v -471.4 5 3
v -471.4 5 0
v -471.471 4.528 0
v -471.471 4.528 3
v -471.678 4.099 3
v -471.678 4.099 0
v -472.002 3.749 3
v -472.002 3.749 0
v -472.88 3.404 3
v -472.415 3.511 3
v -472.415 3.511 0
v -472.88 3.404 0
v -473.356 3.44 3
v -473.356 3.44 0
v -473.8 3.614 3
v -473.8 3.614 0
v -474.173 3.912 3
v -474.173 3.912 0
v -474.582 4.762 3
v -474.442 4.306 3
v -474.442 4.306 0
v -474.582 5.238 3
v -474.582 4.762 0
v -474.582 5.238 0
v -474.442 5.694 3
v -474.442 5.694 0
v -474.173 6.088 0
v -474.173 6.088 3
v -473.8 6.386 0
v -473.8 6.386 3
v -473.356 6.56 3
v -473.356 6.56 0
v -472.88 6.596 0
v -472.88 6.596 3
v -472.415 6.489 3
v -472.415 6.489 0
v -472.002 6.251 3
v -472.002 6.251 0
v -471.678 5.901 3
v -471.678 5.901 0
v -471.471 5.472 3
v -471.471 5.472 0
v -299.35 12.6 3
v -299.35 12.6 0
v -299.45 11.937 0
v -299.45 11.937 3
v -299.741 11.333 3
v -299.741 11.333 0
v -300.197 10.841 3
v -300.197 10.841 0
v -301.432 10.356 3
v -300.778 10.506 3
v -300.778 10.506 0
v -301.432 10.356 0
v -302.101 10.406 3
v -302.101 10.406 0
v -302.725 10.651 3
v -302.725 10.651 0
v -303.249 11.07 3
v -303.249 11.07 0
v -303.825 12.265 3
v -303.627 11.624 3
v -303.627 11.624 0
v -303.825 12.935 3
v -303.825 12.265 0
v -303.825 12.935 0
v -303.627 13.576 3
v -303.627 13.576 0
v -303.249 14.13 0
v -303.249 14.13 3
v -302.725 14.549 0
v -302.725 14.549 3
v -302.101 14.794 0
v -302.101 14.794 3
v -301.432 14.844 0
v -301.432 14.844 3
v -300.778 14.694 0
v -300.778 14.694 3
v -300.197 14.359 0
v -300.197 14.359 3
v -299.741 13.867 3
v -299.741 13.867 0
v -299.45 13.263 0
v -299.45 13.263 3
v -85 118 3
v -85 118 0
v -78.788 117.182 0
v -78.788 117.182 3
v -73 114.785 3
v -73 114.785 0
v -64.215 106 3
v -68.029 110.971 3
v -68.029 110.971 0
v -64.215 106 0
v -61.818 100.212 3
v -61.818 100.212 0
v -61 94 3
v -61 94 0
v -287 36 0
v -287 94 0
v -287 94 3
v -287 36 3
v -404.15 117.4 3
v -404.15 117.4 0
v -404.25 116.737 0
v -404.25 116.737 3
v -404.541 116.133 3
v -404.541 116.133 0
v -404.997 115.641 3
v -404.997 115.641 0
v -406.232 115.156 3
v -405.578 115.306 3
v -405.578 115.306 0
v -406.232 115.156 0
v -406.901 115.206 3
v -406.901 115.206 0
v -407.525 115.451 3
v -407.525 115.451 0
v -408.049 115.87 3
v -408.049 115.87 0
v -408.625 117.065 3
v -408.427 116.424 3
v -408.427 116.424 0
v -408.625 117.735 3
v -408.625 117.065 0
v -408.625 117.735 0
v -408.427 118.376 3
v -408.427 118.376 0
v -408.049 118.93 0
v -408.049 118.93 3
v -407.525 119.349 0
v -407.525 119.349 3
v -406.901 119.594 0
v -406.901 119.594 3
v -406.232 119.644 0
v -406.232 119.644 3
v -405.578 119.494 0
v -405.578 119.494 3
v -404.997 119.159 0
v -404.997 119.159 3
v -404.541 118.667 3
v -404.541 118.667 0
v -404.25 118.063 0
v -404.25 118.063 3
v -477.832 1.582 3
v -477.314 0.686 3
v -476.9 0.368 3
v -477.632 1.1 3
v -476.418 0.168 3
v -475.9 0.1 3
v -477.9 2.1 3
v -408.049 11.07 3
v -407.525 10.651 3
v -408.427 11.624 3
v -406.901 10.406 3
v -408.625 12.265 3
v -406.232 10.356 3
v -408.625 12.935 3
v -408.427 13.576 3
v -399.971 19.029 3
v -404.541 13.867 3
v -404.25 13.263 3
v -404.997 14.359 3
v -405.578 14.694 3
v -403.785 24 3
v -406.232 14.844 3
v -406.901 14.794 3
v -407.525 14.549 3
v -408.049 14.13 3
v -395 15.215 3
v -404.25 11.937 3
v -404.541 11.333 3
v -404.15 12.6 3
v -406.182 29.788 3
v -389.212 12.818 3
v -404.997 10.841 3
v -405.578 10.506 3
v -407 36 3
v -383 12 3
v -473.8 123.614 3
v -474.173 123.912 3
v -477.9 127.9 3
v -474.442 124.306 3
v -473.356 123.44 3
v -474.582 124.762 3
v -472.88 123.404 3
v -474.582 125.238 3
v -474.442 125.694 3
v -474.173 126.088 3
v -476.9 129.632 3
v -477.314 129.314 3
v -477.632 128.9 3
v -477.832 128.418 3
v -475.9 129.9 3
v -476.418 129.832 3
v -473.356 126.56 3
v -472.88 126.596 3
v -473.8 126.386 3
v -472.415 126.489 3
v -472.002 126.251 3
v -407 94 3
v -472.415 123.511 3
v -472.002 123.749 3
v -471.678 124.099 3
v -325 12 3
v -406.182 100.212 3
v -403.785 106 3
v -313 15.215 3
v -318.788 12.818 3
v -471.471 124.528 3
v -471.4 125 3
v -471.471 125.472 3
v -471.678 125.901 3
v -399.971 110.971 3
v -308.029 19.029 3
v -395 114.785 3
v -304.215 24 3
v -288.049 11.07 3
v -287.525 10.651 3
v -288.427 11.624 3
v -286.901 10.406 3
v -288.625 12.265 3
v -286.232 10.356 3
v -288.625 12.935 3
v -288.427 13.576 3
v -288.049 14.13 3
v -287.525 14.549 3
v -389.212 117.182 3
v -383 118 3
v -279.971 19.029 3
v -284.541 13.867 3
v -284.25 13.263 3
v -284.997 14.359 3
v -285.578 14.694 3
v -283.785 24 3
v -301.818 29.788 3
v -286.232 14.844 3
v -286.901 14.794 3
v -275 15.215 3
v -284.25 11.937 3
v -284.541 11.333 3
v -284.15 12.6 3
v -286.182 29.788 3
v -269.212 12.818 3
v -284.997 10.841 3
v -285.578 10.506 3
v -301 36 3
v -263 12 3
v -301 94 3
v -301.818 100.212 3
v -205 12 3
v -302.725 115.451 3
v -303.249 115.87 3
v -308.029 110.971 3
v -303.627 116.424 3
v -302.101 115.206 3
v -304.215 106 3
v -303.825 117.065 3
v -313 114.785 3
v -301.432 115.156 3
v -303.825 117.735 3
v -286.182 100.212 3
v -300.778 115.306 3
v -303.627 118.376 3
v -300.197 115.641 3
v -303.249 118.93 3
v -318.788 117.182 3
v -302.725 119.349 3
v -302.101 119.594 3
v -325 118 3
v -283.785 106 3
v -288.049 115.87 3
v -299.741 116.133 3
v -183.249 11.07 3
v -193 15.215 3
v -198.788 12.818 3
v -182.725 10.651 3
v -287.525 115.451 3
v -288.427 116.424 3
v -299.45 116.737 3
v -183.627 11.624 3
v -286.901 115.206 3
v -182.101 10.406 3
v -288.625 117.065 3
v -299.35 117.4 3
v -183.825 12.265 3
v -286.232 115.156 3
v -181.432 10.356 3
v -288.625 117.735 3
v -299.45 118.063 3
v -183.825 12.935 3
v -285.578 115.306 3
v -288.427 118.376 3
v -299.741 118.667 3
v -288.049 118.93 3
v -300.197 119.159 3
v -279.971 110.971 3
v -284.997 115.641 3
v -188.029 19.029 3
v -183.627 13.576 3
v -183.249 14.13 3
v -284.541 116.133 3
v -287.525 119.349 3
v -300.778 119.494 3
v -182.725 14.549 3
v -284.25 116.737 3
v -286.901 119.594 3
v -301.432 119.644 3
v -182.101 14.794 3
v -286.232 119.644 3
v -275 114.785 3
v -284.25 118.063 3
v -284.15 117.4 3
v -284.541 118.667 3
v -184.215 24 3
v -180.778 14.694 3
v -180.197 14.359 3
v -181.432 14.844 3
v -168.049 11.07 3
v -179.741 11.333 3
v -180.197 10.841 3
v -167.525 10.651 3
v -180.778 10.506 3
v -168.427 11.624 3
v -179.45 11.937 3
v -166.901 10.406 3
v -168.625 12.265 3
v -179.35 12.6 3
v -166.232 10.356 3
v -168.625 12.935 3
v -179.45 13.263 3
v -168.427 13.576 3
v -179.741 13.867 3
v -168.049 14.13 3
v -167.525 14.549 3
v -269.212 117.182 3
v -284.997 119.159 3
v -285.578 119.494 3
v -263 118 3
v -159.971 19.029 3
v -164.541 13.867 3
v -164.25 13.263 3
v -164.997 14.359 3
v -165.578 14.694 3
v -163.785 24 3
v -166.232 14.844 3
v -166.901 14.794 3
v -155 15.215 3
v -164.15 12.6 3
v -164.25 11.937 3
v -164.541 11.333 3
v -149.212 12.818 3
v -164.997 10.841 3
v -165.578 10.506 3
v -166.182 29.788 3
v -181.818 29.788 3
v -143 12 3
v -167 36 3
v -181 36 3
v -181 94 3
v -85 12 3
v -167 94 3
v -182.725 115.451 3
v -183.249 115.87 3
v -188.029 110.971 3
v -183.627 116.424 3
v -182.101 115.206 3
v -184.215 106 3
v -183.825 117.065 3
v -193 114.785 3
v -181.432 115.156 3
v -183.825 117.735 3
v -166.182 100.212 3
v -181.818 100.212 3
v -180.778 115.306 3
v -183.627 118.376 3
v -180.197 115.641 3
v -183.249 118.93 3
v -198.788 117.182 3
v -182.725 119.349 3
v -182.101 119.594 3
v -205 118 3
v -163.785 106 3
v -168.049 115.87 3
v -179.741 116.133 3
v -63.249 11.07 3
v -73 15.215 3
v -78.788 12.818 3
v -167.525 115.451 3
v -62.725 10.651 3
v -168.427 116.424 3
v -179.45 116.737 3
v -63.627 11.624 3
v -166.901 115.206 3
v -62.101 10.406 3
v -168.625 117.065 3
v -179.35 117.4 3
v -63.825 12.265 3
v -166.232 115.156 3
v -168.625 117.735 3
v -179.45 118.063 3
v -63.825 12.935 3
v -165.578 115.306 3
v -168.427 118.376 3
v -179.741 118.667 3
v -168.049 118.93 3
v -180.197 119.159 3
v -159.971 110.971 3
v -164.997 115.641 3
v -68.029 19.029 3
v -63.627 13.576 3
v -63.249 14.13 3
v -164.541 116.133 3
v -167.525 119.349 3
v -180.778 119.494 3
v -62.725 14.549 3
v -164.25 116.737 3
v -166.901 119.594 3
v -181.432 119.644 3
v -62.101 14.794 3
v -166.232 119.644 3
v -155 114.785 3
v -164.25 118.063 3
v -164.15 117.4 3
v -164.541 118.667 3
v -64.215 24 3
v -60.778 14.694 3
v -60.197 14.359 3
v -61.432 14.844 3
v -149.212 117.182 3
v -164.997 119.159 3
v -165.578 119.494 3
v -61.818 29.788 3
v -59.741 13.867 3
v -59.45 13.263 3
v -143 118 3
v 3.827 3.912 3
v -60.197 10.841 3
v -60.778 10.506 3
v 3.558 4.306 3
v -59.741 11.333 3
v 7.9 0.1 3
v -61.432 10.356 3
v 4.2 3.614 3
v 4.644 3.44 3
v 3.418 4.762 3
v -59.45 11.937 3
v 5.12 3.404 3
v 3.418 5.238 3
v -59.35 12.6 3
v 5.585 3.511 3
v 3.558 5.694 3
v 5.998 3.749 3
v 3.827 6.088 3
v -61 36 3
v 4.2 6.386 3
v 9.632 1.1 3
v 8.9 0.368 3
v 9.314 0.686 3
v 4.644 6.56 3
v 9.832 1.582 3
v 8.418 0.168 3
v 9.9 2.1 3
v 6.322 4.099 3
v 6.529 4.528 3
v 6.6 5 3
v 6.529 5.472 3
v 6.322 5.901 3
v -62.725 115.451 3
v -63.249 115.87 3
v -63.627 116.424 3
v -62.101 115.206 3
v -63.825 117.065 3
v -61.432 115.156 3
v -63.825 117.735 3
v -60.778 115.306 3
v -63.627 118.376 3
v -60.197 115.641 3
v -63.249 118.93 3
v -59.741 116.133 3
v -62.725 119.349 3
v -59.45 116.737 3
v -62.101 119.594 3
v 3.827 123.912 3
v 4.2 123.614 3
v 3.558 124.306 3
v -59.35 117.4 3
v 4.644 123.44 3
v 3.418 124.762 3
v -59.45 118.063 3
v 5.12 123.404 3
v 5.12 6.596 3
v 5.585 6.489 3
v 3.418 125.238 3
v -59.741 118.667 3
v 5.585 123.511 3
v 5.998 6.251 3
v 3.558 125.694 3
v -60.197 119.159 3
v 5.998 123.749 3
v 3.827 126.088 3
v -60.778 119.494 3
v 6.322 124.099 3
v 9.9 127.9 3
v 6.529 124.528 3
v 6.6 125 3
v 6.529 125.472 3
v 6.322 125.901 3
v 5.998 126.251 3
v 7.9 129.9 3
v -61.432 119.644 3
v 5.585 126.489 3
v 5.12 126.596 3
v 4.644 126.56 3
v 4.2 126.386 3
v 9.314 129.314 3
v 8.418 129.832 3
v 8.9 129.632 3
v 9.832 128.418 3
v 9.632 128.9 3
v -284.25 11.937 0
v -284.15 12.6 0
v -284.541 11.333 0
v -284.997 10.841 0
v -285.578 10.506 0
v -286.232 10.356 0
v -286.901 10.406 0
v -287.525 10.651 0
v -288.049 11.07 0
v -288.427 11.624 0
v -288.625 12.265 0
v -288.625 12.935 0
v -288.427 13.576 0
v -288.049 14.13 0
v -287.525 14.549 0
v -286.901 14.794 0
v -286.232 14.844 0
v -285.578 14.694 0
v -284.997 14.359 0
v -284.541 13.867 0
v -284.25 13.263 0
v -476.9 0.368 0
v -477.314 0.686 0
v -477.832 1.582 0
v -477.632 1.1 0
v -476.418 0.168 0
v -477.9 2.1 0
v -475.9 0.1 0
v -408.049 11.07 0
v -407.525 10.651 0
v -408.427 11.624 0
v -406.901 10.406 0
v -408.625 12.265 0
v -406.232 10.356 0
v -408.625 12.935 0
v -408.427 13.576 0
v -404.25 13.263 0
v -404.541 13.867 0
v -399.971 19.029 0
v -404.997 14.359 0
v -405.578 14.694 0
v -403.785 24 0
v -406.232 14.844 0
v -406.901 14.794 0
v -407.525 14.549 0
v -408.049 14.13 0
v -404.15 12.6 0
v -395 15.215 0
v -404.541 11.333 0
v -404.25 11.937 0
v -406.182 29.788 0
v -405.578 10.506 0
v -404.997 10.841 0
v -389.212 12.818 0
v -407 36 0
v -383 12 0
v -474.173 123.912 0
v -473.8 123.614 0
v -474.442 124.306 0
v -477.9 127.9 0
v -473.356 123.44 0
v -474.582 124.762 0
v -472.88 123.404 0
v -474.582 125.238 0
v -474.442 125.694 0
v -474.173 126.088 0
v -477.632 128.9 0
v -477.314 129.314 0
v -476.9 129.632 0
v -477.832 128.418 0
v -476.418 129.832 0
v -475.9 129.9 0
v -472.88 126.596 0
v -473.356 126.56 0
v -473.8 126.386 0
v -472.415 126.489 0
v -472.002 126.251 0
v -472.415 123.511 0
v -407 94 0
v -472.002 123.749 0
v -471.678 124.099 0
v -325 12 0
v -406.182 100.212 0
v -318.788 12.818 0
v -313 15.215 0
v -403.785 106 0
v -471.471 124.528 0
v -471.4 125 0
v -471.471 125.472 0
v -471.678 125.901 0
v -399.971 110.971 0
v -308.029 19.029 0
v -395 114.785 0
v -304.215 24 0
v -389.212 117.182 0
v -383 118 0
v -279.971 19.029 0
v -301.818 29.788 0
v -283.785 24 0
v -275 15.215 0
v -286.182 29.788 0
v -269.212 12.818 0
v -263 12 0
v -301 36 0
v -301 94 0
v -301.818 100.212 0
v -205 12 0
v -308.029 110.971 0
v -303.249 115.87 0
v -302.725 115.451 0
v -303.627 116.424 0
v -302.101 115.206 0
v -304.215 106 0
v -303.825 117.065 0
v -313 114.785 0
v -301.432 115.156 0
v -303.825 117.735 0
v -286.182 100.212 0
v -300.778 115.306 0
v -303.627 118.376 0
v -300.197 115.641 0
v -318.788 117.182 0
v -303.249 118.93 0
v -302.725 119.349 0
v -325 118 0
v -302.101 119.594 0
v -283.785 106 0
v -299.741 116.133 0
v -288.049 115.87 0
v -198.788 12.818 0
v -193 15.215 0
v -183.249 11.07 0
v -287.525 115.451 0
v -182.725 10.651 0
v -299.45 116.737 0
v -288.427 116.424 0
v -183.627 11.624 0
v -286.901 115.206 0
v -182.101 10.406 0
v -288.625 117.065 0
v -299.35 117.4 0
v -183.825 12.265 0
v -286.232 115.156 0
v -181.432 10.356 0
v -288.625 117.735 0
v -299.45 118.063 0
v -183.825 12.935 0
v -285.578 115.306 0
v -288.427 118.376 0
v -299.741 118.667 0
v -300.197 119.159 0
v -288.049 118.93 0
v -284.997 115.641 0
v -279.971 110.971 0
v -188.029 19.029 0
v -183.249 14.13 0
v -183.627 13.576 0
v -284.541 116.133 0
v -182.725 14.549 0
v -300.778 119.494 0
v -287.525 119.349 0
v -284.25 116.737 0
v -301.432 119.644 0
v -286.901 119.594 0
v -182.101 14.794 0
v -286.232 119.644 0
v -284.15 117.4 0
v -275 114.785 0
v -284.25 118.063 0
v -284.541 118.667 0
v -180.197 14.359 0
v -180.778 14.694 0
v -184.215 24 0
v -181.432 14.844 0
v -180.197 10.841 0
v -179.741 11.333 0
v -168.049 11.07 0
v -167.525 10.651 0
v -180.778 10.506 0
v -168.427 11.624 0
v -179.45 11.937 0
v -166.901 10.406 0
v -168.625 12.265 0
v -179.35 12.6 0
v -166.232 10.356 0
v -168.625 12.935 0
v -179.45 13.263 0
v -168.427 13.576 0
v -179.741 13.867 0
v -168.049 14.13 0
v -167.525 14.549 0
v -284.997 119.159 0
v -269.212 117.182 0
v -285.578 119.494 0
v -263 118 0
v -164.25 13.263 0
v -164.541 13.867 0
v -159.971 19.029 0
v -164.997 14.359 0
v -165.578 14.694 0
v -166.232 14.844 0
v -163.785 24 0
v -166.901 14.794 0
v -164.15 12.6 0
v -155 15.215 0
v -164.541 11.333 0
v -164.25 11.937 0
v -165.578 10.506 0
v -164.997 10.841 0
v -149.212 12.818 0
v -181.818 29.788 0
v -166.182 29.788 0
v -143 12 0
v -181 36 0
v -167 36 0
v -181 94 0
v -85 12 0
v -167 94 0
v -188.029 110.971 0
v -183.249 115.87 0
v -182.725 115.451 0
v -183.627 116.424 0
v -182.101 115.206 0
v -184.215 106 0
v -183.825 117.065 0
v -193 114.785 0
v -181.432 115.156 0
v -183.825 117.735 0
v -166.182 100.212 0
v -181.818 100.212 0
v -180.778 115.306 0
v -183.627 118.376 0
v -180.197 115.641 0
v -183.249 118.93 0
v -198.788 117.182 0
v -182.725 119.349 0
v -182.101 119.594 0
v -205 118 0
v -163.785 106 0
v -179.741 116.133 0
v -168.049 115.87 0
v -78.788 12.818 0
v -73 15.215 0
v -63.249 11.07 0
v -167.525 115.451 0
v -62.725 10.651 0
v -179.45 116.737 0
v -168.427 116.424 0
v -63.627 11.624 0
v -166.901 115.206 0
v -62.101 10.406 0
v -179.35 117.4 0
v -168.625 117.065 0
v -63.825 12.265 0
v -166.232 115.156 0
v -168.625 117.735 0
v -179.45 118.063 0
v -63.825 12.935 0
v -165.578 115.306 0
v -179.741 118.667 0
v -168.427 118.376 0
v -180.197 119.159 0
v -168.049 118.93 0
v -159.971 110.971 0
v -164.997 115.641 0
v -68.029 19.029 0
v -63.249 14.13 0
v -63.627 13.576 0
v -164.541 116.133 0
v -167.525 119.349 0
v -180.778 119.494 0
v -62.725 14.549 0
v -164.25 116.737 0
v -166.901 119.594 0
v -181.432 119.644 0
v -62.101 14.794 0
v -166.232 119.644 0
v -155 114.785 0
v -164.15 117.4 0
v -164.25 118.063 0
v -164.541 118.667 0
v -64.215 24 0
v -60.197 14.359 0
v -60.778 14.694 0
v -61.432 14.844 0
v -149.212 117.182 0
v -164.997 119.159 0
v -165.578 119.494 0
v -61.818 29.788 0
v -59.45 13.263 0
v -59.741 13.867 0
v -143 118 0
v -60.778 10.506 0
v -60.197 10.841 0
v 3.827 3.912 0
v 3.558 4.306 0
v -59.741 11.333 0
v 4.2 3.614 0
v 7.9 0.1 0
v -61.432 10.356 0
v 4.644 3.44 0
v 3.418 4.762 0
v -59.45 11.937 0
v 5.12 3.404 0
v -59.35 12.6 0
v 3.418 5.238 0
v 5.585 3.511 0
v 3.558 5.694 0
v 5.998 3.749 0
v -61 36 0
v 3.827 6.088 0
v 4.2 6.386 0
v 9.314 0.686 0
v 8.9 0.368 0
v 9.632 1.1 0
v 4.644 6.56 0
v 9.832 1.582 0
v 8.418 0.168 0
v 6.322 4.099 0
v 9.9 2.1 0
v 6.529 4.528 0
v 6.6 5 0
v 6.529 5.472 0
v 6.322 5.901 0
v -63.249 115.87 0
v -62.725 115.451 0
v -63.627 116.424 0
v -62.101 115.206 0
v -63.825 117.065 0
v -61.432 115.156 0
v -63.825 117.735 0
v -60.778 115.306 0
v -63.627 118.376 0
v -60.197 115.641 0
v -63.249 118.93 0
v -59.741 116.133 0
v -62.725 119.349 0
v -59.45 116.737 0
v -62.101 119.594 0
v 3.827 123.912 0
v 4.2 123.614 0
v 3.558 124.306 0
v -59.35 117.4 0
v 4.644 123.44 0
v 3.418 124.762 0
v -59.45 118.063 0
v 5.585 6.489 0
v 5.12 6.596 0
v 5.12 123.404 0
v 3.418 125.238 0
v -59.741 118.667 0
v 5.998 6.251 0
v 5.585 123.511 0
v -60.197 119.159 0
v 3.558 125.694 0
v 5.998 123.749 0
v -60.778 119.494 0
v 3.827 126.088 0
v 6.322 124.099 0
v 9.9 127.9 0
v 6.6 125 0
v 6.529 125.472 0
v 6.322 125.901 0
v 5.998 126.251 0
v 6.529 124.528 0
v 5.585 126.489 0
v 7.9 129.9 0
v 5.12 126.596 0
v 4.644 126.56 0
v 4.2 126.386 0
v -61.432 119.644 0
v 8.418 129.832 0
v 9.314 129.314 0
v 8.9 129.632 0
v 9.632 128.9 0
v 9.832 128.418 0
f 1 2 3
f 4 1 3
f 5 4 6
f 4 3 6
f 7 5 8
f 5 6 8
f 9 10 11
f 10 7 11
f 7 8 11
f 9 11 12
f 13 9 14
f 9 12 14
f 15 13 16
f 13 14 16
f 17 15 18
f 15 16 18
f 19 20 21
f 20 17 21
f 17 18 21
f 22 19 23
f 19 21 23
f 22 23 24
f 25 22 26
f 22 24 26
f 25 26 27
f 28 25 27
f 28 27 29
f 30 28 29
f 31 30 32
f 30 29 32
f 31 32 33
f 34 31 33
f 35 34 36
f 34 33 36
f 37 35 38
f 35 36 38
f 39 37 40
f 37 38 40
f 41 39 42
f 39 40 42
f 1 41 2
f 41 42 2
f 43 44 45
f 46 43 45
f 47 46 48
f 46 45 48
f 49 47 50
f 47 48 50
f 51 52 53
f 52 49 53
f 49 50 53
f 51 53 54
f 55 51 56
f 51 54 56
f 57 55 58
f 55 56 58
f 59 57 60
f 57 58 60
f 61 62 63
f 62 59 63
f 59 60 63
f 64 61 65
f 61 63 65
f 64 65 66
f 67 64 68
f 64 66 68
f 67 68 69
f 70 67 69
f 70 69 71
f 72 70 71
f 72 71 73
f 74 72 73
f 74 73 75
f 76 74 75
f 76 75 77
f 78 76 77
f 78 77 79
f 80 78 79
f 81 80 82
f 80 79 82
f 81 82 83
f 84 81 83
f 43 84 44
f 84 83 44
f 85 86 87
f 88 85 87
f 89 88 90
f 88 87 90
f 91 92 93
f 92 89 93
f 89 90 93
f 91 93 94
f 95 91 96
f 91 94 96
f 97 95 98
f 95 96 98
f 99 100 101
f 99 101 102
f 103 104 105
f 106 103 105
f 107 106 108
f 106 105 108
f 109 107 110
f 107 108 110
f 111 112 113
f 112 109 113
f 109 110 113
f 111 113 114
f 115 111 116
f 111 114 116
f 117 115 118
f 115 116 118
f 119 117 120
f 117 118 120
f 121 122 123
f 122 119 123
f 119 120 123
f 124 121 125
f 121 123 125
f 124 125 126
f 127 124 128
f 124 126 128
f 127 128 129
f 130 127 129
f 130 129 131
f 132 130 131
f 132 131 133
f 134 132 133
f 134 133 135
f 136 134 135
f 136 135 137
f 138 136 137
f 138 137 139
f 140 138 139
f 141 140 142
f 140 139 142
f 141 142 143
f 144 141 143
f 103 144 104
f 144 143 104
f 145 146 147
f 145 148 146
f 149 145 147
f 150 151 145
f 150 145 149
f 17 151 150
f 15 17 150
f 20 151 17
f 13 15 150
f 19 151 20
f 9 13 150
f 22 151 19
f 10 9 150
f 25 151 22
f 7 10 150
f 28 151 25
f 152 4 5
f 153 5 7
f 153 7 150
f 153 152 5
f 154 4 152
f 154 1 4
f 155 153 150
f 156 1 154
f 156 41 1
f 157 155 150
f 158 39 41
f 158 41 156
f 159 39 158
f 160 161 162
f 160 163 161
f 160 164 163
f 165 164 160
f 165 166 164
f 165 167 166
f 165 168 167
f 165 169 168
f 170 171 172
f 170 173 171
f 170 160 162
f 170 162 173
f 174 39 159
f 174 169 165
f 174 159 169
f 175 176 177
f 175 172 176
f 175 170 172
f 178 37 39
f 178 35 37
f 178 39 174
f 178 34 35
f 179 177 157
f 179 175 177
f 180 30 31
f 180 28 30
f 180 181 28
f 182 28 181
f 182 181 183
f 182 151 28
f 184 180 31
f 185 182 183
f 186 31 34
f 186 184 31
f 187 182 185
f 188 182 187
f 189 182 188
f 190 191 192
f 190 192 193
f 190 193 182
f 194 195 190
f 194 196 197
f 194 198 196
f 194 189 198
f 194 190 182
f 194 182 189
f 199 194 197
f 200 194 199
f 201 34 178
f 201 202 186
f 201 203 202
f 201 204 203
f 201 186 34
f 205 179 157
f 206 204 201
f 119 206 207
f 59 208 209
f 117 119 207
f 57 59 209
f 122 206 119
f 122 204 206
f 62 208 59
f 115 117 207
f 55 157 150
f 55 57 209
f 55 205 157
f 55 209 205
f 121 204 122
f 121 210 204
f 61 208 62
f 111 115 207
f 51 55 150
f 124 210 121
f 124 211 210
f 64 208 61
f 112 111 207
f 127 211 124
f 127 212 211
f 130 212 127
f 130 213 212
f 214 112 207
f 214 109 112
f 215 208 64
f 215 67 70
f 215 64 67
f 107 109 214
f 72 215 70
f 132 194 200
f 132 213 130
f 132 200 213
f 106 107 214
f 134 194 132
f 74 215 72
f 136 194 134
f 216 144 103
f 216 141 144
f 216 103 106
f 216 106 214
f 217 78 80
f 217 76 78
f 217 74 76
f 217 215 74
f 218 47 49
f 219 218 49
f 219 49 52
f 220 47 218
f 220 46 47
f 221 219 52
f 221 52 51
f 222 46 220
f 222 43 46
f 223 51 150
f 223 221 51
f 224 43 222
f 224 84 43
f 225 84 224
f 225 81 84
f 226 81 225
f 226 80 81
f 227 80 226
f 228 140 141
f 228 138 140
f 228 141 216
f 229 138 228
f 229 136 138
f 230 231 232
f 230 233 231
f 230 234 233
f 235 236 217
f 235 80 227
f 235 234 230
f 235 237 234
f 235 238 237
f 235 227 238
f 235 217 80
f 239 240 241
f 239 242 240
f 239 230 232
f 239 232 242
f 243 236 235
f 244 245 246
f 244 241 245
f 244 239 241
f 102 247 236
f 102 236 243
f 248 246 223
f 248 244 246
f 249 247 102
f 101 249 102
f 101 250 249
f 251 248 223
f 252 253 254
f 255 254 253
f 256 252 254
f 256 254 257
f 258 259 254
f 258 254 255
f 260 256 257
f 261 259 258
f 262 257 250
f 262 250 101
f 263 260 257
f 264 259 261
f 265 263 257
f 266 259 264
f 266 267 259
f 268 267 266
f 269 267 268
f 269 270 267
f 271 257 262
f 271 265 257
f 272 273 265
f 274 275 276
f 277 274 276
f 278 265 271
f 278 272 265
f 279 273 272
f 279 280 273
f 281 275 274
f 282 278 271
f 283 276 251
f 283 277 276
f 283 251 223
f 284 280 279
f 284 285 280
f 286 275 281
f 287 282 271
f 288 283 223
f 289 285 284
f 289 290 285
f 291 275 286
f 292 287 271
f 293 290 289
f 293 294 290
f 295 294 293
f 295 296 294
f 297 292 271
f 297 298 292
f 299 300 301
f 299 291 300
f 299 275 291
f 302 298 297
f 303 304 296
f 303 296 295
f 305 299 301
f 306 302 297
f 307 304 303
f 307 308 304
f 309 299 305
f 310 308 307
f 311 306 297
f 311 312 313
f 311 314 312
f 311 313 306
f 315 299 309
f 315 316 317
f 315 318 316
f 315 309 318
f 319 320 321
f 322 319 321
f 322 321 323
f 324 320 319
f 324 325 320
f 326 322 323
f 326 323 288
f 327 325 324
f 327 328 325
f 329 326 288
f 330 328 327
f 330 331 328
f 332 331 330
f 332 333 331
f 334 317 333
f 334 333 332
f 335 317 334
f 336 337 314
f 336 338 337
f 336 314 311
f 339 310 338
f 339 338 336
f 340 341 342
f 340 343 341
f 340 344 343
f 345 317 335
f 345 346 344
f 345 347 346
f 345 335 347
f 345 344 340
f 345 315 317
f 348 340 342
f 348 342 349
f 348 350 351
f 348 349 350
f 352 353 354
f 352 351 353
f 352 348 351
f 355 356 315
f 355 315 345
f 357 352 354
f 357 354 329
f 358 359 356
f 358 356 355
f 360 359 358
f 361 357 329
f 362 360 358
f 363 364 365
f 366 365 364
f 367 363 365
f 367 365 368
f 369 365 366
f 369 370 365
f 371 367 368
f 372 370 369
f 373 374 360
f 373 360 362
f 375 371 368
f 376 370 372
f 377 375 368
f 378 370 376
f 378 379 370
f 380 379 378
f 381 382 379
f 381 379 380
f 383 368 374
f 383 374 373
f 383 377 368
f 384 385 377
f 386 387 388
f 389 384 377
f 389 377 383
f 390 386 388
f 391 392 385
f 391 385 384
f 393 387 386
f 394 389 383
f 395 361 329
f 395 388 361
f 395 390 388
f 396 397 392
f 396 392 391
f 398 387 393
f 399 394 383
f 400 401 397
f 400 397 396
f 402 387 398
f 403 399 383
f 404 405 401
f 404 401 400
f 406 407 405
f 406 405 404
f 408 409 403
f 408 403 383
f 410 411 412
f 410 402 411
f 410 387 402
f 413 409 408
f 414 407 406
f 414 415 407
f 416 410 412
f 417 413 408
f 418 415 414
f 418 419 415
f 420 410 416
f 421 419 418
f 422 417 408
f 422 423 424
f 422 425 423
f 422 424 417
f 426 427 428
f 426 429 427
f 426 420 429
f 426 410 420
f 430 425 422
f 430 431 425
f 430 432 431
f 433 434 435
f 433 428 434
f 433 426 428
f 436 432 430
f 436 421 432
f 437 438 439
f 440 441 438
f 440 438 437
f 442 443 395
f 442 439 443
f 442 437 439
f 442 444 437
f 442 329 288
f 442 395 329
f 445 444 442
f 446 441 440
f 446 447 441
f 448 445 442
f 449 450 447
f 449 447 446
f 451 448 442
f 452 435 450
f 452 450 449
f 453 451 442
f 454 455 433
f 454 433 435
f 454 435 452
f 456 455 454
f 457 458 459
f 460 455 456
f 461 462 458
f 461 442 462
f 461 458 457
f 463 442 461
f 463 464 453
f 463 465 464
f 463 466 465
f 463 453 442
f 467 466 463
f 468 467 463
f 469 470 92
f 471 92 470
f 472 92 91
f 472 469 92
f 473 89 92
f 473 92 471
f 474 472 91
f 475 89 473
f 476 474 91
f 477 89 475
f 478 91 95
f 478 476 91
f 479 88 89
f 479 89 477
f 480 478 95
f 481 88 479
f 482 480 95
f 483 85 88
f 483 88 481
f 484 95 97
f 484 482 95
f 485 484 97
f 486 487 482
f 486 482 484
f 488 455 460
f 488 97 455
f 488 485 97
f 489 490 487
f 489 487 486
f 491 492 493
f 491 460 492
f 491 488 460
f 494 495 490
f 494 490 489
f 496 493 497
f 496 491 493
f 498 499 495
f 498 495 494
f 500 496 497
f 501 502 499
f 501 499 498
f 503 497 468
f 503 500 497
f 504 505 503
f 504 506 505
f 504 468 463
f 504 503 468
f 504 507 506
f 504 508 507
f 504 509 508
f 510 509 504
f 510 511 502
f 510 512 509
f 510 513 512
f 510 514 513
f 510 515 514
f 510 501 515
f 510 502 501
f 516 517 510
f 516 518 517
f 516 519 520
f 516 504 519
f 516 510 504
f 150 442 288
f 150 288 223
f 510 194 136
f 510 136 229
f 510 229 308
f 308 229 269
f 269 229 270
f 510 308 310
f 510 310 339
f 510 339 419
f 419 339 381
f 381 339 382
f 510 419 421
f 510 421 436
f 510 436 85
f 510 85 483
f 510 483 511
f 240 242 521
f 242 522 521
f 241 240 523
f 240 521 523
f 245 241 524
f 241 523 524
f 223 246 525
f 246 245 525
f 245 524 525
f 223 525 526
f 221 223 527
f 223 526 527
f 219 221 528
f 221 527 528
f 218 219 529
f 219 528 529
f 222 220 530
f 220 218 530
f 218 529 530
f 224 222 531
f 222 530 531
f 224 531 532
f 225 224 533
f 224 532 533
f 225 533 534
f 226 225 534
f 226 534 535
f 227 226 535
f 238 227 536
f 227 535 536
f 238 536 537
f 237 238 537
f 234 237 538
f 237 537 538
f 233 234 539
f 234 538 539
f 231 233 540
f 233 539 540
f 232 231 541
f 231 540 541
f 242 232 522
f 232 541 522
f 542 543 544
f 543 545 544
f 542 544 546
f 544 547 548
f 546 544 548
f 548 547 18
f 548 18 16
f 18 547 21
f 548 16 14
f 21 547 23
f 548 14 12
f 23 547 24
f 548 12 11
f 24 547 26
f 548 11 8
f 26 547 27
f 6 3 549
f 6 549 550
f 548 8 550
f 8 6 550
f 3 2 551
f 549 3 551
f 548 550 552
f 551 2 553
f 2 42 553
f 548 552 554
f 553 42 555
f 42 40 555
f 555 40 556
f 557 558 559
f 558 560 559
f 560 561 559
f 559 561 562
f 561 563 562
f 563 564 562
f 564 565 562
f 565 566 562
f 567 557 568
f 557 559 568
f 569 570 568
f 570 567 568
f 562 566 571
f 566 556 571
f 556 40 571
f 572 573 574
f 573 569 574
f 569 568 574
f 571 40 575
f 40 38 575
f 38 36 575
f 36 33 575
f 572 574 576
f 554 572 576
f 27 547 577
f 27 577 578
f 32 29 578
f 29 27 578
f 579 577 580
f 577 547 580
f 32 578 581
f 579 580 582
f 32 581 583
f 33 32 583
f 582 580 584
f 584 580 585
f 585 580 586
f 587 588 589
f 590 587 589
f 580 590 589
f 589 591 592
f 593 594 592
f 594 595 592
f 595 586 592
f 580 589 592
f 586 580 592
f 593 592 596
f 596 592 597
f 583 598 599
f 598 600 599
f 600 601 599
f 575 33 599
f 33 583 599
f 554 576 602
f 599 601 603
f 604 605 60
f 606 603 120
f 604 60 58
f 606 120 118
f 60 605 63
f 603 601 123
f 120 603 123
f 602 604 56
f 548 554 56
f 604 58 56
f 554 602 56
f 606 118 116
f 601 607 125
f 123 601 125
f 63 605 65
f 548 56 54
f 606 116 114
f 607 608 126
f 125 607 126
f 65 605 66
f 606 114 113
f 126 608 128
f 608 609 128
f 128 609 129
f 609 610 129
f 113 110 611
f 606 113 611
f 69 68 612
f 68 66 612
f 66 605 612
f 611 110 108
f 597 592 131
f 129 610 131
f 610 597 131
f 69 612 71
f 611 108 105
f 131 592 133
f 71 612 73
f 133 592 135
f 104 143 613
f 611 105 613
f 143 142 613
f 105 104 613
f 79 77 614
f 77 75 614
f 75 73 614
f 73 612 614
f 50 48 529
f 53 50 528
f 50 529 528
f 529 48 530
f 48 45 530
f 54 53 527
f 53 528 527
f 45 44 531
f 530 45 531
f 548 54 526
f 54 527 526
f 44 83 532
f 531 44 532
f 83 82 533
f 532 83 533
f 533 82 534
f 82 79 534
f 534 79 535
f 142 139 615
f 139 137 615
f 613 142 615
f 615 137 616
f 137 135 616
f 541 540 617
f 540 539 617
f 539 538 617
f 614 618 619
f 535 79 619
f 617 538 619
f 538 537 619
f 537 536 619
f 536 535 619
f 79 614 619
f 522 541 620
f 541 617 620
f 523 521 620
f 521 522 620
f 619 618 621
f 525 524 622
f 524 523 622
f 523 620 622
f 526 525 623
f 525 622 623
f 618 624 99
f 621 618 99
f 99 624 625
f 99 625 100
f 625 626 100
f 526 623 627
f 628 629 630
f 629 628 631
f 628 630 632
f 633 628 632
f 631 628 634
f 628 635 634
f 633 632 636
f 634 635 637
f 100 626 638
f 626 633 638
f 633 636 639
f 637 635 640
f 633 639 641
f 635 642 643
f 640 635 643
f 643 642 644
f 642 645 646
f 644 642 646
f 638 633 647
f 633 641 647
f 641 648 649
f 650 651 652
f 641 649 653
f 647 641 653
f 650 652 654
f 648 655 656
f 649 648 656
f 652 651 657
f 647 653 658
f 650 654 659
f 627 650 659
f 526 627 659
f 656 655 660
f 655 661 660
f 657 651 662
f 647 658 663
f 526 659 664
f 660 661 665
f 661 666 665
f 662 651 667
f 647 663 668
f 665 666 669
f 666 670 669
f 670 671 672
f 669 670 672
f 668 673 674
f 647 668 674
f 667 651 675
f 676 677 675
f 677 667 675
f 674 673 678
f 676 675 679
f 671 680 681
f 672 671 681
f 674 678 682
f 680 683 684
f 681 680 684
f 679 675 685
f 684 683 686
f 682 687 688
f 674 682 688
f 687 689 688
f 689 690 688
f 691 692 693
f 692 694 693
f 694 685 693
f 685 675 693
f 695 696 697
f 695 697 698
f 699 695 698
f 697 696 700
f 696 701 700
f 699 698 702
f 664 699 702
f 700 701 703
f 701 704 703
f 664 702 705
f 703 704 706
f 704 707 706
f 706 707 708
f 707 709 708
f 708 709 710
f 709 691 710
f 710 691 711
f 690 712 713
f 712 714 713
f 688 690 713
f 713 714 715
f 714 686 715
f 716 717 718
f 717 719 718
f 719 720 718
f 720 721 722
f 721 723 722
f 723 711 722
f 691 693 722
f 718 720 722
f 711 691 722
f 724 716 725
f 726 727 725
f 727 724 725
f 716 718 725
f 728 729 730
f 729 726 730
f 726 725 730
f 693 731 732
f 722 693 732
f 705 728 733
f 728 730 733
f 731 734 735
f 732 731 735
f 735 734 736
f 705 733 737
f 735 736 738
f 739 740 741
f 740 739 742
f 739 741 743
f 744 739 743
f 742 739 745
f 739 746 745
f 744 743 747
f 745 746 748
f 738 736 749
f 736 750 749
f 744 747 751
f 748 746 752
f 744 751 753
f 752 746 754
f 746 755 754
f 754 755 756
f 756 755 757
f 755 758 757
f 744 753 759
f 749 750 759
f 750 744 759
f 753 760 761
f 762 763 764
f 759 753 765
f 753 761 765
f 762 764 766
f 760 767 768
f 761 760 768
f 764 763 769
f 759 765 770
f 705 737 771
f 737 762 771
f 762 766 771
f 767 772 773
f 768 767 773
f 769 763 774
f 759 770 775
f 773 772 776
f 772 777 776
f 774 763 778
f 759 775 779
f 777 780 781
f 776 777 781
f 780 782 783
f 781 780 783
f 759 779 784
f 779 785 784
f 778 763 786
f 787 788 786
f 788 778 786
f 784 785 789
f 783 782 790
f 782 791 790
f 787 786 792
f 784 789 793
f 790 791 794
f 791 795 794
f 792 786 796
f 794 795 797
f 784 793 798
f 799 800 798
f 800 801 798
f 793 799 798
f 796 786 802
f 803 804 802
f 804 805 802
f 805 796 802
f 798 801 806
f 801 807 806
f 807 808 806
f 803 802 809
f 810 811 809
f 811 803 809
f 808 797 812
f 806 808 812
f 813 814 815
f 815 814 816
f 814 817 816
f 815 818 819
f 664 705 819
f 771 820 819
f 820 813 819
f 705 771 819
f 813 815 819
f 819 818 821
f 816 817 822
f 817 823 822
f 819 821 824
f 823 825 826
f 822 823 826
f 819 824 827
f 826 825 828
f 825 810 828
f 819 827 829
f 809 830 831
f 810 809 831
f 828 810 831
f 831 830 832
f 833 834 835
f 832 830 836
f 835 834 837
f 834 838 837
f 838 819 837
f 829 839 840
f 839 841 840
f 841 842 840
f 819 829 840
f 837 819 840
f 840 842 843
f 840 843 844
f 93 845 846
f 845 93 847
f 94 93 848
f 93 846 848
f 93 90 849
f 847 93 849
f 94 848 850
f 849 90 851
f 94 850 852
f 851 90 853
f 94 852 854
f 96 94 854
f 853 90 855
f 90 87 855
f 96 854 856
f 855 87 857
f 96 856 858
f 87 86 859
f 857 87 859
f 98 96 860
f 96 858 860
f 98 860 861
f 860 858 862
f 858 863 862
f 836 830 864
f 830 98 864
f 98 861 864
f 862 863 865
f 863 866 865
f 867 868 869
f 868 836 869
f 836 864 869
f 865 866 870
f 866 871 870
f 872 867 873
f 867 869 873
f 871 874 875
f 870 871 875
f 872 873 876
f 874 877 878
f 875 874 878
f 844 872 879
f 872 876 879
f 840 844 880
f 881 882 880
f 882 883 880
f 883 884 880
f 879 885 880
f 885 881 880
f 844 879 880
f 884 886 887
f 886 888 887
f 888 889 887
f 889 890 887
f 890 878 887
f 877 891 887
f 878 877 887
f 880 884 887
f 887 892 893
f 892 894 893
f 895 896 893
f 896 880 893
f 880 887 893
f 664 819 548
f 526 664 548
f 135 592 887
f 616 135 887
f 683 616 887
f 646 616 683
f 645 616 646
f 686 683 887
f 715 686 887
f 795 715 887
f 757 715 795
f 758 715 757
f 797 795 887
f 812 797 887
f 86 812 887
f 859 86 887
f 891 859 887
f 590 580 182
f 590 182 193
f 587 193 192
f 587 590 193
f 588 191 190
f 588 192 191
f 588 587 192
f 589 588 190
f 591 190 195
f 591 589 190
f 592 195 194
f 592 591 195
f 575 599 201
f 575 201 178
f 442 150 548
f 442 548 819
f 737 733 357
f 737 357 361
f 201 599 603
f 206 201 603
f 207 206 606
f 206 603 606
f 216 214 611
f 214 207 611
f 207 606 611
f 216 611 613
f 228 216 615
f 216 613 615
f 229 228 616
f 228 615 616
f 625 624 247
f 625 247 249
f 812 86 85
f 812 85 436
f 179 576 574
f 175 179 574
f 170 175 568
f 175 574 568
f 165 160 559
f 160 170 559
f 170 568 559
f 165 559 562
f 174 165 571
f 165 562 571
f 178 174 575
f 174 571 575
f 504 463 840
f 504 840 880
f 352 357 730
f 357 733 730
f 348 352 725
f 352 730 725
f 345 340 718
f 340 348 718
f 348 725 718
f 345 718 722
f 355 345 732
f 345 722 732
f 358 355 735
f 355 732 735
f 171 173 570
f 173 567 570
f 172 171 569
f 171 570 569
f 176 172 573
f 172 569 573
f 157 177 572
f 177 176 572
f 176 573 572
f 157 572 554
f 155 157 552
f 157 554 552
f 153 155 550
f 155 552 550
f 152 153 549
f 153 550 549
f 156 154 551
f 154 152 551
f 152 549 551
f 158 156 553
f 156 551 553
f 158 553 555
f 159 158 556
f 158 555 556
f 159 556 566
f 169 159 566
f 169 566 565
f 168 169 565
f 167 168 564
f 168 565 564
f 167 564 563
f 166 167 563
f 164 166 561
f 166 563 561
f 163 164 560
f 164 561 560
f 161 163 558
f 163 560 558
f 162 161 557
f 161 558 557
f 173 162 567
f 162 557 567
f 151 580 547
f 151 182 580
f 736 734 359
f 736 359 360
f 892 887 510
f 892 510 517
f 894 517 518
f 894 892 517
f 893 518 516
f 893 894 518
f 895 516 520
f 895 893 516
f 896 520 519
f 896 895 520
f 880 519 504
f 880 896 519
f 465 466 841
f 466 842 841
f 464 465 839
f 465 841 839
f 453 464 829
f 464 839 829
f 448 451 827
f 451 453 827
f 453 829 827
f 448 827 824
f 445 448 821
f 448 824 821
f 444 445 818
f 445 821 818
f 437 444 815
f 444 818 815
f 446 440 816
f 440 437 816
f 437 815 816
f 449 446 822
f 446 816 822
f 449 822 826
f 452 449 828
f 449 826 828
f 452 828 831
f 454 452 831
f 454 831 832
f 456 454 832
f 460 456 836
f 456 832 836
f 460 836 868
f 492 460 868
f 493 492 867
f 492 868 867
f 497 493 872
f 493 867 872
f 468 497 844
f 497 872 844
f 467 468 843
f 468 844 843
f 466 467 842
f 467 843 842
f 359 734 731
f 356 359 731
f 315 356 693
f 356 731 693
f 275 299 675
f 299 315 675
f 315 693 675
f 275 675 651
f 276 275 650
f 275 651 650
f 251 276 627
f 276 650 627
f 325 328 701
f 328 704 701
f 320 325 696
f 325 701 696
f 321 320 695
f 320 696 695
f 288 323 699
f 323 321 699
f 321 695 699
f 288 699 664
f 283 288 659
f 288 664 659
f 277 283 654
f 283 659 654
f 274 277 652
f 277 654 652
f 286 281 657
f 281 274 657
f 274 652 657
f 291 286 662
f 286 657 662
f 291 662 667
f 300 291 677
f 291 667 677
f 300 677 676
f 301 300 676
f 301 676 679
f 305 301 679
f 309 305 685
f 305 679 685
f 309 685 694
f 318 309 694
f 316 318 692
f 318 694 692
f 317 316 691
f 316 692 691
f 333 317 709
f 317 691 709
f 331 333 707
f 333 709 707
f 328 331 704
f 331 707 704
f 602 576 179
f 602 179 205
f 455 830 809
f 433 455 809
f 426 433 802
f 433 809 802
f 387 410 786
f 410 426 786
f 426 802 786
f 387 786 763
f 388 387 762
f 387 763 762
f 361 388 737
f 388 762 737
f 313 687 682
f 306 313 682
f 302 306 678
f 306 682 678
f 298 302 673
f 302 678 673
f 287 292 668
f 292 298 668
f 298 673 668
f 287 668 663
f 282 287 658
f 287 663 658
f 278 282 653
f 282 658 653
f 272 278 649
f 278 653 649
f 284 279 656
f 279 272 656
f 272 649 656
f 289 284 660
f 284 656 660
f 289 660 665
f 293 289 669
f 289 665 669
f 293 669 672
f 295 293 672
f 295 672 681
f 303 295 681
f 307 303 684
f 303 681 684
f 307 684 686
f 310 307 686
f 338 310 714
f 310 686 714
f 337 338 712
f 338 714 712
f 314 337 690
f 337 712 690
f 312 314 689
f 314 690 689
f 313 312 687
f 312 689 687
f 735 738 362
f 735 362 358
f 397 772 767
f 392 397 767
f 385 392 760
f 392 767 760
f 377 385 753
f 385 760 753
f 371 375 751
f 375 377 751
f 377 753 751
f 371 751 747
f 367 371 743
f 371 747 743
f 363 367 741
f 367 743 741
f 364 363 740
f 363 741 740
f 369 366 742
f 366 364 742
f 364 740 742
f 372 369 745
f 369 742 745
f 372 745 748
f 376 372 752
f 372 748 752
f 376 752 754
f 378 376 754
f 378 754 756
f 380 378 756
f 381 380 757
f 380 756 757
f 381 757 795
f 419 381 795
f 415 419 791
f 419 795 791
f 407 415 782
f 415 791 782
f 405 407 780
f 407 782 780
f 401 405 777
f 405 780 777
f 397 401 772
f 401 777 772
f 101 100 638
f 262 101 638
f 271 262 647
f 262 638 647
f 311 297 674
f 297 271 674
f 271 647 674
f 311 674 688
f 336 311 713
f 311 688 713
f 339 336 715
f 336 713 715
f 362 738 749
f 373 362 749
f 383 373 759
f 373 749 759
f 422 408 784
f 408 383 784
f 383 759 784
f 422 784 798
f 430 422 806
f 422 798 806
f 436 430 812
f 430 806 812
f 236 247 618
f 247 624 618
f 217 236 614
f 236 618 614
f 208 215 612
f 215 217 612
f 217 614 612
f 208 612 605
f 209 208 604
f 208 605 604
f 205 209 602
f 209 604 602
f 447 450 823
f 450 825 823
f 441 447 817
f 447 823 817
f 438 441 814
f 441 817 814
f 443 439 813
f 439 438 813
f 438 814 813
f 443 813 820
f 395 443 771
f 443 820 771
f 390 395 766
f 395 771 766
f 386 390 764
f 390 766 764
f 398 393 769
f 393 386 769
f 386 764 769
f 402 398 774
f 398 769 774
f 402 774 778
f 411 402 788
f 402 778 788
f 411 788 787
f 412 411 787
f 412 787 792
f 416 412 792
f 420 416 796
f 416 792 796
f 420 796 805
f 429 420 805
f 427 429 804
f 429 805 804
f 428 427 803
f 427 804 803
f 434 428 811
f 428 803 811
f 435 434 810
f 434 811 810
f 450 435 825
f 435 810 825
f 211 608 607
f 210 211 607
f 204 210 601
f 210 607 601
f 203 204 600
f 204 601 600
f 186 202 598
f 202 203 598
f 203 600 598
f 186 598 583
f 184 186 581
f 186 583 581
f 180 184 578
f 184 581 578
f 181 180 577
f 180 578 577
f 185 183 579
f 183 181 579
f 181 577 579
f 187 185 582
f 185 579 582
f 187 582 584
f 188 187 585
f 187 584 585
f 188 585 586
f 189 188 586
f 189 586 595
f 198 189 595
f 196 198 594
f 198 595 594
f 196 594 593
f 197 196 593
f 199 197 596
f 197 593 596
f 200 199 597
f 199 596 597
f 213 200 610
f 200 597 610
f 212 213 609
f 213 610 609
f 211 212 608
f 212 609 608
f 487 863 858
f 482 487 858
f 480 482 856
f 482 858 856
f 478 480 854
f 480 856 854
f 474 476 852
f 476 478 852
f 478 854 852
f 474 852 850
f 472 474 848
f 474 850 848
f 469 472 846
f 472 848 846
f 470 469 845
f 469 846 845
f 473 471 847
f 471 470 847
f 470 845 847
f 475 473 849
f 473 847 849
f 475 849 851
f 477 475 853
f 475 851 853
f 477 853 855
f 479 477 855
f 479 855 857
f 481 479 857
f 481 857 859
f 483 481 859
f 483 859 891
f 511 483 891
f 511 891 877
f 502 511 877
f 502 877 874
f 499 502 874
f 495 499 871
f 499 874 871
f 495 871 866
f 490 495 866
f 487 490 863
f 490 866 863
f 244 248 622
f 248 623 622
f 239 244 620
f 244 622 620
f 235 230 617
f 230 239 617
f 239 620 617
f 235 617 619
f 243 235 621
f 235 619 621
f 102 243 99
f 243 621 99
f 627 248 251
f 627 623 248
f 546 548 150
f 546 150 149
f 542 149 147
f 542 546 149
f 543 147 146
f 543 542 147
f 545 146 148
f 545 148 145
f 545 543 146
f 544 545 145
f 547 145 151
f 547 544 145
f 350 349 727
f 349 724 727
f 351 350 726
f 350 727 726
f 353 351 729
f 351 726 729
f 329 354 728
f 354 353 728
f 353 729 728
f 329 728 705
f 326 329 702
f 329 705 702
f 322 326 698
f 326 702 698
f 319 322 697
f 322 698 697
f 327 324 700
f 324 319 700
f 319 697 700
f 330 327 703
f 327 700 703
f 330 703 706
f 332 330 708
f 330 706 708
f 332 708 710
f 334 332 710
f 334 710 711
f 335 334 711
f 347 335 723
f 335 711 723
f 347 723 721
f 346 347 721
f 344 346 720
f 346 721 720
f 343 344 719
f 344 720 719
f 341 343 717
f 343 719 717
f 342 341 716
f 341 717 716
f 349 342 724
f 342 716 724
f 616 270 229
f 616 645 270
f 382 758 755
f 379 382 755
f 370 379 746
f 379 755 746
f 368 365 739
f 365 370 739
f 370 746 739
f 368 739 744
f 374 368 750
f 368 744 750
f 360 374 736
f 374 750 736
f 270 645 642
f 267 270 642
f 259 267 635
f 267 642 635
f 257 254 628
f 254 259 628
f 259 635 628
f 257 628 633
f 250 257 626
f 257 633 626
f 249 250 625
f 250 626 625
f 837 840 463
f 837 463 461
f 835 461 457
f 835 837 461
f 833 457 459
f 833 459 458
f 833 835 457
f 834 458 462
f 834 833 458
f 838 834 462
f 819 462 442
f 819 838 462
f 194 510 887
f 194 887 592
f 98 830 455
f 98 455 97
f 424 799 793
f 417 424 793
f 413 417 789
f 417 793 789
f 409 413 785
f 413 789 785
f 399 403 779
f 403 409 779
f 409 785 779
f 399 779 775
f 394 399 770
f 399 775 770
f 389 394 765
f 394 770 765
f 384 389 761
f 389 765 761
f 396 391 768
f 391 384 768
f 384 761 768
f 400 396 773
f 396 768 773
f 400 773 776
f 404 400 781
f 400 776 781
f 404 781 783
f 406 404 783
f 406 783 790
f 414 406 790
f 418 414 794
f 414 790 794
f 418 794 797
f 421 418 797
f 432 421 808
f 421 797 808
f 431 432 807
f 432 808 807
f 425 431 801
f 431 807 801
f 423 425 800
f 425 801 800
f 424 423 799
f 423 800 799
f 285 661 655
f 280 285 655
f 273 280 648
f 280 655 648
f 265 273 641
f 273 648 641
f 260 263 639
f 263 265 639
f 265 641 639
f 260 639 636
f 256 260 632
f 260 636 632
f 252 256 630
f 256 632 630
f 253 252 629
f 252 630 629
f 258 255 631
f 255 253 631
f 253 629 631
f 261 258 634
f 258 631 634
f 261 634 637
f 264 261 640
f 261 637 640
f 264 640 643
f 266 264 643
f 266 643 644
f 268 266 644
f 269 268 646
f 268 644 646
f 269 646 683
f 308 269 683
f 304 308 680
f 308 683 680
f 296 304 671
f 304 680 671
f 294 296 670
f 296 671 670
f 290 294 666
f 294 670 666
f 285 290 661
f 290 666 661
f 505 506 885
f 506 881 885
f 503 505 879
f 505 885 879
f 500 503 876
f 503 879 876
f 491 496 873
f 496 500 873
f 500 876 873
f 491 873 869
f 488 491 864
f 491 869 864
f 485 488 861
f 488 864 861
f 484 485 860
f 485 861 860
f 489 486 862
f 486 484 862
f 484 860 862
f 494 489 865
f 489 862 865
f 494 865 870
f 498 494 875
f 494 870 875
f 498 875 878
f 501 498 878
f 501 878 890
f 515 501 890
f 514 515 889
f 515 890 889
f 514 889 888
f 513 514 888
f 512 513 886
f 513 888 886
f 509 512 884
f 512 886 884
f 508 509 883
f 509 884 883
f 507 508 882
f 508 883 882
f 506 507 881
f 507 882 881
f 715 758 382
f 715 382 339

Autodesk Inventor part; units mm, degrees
ref_plane "YZ Plane" through (0, 0, 0) normal (1, 0, 0) x (0, 1, 0)
ref_plane "XZ Plane" through (0, 0, 0) normal (0, 1, 0) x (-1, 0, 0)
ref_plane "XY Plane" through (0, 0, 0) normal (0, 0, 1) x (1, 0, 0)
sketch "スケッチ1" plane through (0, 0, 0) normal (0, 0, 1) x (1, 0, 0)
  circle A0 centre (5, 125) radius 2.25 construction
  circle A1 centre (5, 5) radius 2.25 construction
  circle A2 centre (-473, 125) radius 2.25 construction
  circle A3 centre (-473, 5) radius 2.25 construction
  line L0 (-478, 130) -> (-478, 0) construction
  line L1 (10, 0) -> (10, 130) construction
  line L2 (10, 130) -> (-478, 130)
  line L3 (-478, 130) -> (-478, 0)
  line L4 (-478, 0) -> (10, 0)
  line L5 (10, 0) -> (10, 130)
  circle A4 centre (5, 125) radius 1.6
  circle A5 centre (5, 5) radius 1.6
  circle A6 centre (-473, 5) radius 1.6
  circle A7 centre (-473, 125) radius 1.6
  line L6 (10, 65) -> (-478, 65) construction
  line L7 (-205, 118) -> (-263, 118)
  line L8 (-287, 94) -> (-287, 36)
  line L9 (-263, 12) -> (-205, 12)
  line L10 (-181, 36) -> (-181, 94)
  arc A8 (-181, 94) -> (-205, 118) centre (-205, 94) ccw
  arc A9 (-205, 12) -> (-181, 36) centre (-205, 36) ccw
  arc A10 (-287, 36) -> (-263, 12) centre (-263, 36) ccw
  arc A11 (-263, 118) -> (-287, 94) centre (-263, 94) ccw
  line L11 (-174, 125) -> (-294, 125) construction
  line L12 (-294, 125) -> (-294, 5) construction
  line L13 (-294, 5) -> (-174, 5) construction
  line L14 (-174, 5) -> (-174, 125) construction
  line L15 (-181.6, 117.4) -> (-286.4, 117.4) construction
  line L16 (-286.4, 117.4) -> (-286.4, 12.6) construction
  line L17 (-286.4, 12.6) -> (-181.6, 12.6) construction
  line L18 (-181.6, 12.6) -> (-181.6, 117.4) construction
  circle A12 centre (-181.6, 117.4) radius 2.25
  circle A13 centre (-181.6, 12.6) radius 2.25
  circle A14 centre (-286.4, 12.6) radius 2.25
  circle A15 centre (-286.4, 117.4) radius 2.25
  circle A16 centre (-301.6, 117.4) radius 2.25
  arc A17 (-301, 94) -> (-325, 118) centre (-325, 94) ccw
  line L19 (-301, 36) -> (-301, 94)
  arc A18 (-325, 12) -> (-301, 36) centre (-325, 36) ccw
  circle A19 centre (-301.6, 12.6) radius 2.25
  line L20 (-383, 12) -> (-325, 12)
  arc A20 (-407, 36) -> (-383, 12) centre (-383, 36) ccw
  circle A21 centre (-406.4, 12.6) radius 2.25
  line L21 (-407, 94) -> (-407, 36)
  circle A22 centre (-406.4, 117.4) radius 2.25
  arc A23 (-383, 118) -> (-407, 94) centre (-383, 94) ccw
  line L22 (-325, 118) -> (-383, 118)
  circle A24 centre (-61.6, 117.4) radius 2.25
  arc A25 (-61, 94) -> (-85, 118) centre (-85, 94) ccw
  line L23 (-61, 36) -> (-61, 94)
  arc A26 (-85, 12) -> (-61, 36) centre (-85, 36) ccw
  circle A27 centre (-61.6, 12.6) radius 2.25
  line L24 (-143, 12) -> (-85, 12)
  arc A28 (-167, 36) -> (-143, 12) centre (-143, 36) ccw
  circle A29 centre (-166.4, 12.6) radius 2.25
  line L25 (-167, 94) -> (-167, 36)
  circle A30 centre (-166.4, 117.4) radius 2.25
  arc A31 (-143, 118) -> (-167, 94) centre (-143, 94) ccw
  line L26 (-85, 118) -> (-143, 118)
  circle A32 centre (-181.6, 117.4) radius 2.25
  arc A33 (-181, 94) -> (-205, 118) centre (-205, 94) ccw
  line L27 (-181, 36) -> (-181, 94)
  arc A34 (-205, 12) -> (-181, 36) centre (-205, 36) ccw
  circle A35 centre (-181.6, 12.6) radius 2.25
  line L28 (-263, 12) -> (-205, 12)
  arc A36 (-287, 36) -> (-263, 12) centre (-263, 36) ccw
  circle A37 centre (-286.4, 12.6) radius 2.25
  line L29 (-287, 94) -> (-287, 36)
  circle A38 centre (-286.4, 117.4) radius 2.25
  arc A39 (-263, 118) -> (-287, 94) centre (-263, 94) ccw
  line L30 (-205, 118) -> (-263, 118)
  point P0 (0, 0)
  point P1 (-234, 65)
  point P2 (-287, 12)
  point P3 (-287, 118)
  point P4 (-181, 12)
  point P5 (-287, 65)
  point P6 (-294, 65)
  point P7 (-234, 12)
  point P8 (-234, 5)
  point P9 (-234, 118)
  point P10 (-181, 65)
  point P11 (-174, 65)
  point P12 (-181.6, 65)
  point P13 (-234, 125)
  point P14 (-234, 117.4)
  point P15 (-301, 12)
  point P16 (-301, 65)
  point P17 (-407, 12)
  point P18 (-354, 12)
  point P19 (-407, 118)
  point P20 (-407, 65)
  point P21 (-354, 118)
  point P22 (-61, 12)
  point P23 (-61, 65)
  point P24 (-167, 12)
  point P25 (-114, 12)
  point P26 (-167, 118)
  point P27 (-167, 65)
  point P28 (-114, 118)
  point P29 (-181, 12)
  point P30 (-181, 65)
  point P31 (-287, 12)
  point P32 (-234, 12)
  point P33 (-287, 118)
  point P34 (-287, 65)
  point P35 (-234, 118)
  dimension "d0" = 3.2
  dimension "d1" = 106
  dimension "d2" = 106
  dimension "d3" = 24
  dimension "d4" = 120
  dimension "d5" = 120
  dimension "d6" = 104.8
  dimension "d7" = 104.8
  dimension "d8" = 4.5
  dimension "d11" = 120
  dimension "d14" = 120
extrude "押し出し1" add sketch "スケッチ1" along normal blind 3
sketch "スケッチ2" plane through (0, 0, 3) normal (0, 0, 1) x (1, 0, 0)
  line L0 (-478, 130) -> (-478, 0) projected
  line L1 (-478, 0) -> (10, 0) projected
  line L2 (10, 0) -> (10, 130) projected
  line L3 (10, 130) -> (-478, 130) projected
  circle A0 centre (-286.4, 117.4) radius 2.25 projected
  arc A1 (-263, 118) -> (-287, 94) centre (-263, 94) ccw projected
  line L4 (-263, 118) -> (-205, 118) projected
  arc A2 (-181, 94) -> (-205, 118) centre (-205, 94) ccw projected
  line L5 (-181, 94) -> (-181, 36) projected
  arc A3 (-205, 12) -> (-181, 36) centre (-205, 36) ccw projected
  line L6 (-205, 12) -> (-263, 12) projected
  arc A4 (-287, 36) -> (-263, 12) centre (-263, 36) ccw projected
  line L7 (-287, 36) -> (-287, 94) projected
  circle A5 centre (-473, 125) radius 1.6 projected
  circle A6 centre (-473, 5) radius 1.6 projected
  circle A7 centre (5, 5) radius 1.6 projected
  circle A8 centre (5, 125) radius 1.6 projected
  circle A9 centre (-181.6, 117.4) radius 2.25 projected
  circle A10 centre (-181.6, 12.6) radius 2.25 projected
  circle A11 centre (-286.4, 12.6) radius 2.25 projected
  circle A12 centre (-166.4, 117.4) radius 2.25 projected
  circle A13 centre (-166.4, 12.6) radius 2.25 projected
  circle A14 centre (-61.6, 12.6) radius 2.25 projected
  line L8 (-61, 94) -> (-61, 36) projected
  arc A15 (-85, 12) -> (-61, 36) centre (-85, 36) ccw projected
  line L9 (-85, 12) -> (-143, 12) projected
  arc A16 (-167, 36) -> (-143, 12) centre (-143, 36) ccw projected
  line L10 (-167, 36) -> (-167, 94) projected
  arc A17 (-143, 118) -> (-167, 94) centre (-143, 94) ccw projected
  line L11 (-143, 118) -> (-85, 118) projected
  arc A18 (-61, 94) -> (-85, 118) centre (-85, 94) ccw projected
  circle A19 centre (-61.6, 117.4) radius 2.25 projected
  circle A20 centre (-406.4, 117.4) radius 2.25 projected
  circle A21 centre (-406.4, 12.6) radius 2.25 projected
  circle A22 centre (-301.6, 12.6) radius 2.25 projected
  line L12 (-301, 94) -> (-301, 36) projected
  arc A23 (-325, 12) -> (-301, 36) centre (-325, 36) ccw projected
  line L13 (-325, 12) -> (-383, 12) projected
  arc A24 (-407, 36) -> (-383, 12) centre (-383, 36) ccw projected
  line L14 (-407, 36) -> (-407, 94) projected
  arc A25 (-383, 118) -> (-407, 94) centre (-383, 94) ccw projected
  line L15 (-383, 118) -> (-325, 118) projected
  arc A26 (-301, 94) -> (-325, 118) centre (-325, 94) ccw projected
  circle A27 centre (-301.6, 117.4) radius 2.25 projected
  line L16 (-477.9, 129.9) -> (-477.9, 0.1)
  line L17 (-477.9, 0.1) -> (9.9, 0.1)
  line L18 (9.9, 0.1) -> (9.9, 129.9)
  line L19 (9.9, 129.9) -> (-477.9, 129.9)
  point P0 (0, 0)
  dimension "d19" = 0.1
extrude "押し出し2" cut sketch "スケッチ2" against normal through all contours L3 L2 L1 L0
fillet "フィレット1" radius 2 4 edges at (-477.9, 129.9, 1.5) (-477.9, 0.1, 1.5) (9.9, 0.1, 1.5) (9.9, 129.9, 1.5)
equation "\"d5\" = d4"
equation "\"d7\" = d6"
properties part number "radiator_adapter_03"
